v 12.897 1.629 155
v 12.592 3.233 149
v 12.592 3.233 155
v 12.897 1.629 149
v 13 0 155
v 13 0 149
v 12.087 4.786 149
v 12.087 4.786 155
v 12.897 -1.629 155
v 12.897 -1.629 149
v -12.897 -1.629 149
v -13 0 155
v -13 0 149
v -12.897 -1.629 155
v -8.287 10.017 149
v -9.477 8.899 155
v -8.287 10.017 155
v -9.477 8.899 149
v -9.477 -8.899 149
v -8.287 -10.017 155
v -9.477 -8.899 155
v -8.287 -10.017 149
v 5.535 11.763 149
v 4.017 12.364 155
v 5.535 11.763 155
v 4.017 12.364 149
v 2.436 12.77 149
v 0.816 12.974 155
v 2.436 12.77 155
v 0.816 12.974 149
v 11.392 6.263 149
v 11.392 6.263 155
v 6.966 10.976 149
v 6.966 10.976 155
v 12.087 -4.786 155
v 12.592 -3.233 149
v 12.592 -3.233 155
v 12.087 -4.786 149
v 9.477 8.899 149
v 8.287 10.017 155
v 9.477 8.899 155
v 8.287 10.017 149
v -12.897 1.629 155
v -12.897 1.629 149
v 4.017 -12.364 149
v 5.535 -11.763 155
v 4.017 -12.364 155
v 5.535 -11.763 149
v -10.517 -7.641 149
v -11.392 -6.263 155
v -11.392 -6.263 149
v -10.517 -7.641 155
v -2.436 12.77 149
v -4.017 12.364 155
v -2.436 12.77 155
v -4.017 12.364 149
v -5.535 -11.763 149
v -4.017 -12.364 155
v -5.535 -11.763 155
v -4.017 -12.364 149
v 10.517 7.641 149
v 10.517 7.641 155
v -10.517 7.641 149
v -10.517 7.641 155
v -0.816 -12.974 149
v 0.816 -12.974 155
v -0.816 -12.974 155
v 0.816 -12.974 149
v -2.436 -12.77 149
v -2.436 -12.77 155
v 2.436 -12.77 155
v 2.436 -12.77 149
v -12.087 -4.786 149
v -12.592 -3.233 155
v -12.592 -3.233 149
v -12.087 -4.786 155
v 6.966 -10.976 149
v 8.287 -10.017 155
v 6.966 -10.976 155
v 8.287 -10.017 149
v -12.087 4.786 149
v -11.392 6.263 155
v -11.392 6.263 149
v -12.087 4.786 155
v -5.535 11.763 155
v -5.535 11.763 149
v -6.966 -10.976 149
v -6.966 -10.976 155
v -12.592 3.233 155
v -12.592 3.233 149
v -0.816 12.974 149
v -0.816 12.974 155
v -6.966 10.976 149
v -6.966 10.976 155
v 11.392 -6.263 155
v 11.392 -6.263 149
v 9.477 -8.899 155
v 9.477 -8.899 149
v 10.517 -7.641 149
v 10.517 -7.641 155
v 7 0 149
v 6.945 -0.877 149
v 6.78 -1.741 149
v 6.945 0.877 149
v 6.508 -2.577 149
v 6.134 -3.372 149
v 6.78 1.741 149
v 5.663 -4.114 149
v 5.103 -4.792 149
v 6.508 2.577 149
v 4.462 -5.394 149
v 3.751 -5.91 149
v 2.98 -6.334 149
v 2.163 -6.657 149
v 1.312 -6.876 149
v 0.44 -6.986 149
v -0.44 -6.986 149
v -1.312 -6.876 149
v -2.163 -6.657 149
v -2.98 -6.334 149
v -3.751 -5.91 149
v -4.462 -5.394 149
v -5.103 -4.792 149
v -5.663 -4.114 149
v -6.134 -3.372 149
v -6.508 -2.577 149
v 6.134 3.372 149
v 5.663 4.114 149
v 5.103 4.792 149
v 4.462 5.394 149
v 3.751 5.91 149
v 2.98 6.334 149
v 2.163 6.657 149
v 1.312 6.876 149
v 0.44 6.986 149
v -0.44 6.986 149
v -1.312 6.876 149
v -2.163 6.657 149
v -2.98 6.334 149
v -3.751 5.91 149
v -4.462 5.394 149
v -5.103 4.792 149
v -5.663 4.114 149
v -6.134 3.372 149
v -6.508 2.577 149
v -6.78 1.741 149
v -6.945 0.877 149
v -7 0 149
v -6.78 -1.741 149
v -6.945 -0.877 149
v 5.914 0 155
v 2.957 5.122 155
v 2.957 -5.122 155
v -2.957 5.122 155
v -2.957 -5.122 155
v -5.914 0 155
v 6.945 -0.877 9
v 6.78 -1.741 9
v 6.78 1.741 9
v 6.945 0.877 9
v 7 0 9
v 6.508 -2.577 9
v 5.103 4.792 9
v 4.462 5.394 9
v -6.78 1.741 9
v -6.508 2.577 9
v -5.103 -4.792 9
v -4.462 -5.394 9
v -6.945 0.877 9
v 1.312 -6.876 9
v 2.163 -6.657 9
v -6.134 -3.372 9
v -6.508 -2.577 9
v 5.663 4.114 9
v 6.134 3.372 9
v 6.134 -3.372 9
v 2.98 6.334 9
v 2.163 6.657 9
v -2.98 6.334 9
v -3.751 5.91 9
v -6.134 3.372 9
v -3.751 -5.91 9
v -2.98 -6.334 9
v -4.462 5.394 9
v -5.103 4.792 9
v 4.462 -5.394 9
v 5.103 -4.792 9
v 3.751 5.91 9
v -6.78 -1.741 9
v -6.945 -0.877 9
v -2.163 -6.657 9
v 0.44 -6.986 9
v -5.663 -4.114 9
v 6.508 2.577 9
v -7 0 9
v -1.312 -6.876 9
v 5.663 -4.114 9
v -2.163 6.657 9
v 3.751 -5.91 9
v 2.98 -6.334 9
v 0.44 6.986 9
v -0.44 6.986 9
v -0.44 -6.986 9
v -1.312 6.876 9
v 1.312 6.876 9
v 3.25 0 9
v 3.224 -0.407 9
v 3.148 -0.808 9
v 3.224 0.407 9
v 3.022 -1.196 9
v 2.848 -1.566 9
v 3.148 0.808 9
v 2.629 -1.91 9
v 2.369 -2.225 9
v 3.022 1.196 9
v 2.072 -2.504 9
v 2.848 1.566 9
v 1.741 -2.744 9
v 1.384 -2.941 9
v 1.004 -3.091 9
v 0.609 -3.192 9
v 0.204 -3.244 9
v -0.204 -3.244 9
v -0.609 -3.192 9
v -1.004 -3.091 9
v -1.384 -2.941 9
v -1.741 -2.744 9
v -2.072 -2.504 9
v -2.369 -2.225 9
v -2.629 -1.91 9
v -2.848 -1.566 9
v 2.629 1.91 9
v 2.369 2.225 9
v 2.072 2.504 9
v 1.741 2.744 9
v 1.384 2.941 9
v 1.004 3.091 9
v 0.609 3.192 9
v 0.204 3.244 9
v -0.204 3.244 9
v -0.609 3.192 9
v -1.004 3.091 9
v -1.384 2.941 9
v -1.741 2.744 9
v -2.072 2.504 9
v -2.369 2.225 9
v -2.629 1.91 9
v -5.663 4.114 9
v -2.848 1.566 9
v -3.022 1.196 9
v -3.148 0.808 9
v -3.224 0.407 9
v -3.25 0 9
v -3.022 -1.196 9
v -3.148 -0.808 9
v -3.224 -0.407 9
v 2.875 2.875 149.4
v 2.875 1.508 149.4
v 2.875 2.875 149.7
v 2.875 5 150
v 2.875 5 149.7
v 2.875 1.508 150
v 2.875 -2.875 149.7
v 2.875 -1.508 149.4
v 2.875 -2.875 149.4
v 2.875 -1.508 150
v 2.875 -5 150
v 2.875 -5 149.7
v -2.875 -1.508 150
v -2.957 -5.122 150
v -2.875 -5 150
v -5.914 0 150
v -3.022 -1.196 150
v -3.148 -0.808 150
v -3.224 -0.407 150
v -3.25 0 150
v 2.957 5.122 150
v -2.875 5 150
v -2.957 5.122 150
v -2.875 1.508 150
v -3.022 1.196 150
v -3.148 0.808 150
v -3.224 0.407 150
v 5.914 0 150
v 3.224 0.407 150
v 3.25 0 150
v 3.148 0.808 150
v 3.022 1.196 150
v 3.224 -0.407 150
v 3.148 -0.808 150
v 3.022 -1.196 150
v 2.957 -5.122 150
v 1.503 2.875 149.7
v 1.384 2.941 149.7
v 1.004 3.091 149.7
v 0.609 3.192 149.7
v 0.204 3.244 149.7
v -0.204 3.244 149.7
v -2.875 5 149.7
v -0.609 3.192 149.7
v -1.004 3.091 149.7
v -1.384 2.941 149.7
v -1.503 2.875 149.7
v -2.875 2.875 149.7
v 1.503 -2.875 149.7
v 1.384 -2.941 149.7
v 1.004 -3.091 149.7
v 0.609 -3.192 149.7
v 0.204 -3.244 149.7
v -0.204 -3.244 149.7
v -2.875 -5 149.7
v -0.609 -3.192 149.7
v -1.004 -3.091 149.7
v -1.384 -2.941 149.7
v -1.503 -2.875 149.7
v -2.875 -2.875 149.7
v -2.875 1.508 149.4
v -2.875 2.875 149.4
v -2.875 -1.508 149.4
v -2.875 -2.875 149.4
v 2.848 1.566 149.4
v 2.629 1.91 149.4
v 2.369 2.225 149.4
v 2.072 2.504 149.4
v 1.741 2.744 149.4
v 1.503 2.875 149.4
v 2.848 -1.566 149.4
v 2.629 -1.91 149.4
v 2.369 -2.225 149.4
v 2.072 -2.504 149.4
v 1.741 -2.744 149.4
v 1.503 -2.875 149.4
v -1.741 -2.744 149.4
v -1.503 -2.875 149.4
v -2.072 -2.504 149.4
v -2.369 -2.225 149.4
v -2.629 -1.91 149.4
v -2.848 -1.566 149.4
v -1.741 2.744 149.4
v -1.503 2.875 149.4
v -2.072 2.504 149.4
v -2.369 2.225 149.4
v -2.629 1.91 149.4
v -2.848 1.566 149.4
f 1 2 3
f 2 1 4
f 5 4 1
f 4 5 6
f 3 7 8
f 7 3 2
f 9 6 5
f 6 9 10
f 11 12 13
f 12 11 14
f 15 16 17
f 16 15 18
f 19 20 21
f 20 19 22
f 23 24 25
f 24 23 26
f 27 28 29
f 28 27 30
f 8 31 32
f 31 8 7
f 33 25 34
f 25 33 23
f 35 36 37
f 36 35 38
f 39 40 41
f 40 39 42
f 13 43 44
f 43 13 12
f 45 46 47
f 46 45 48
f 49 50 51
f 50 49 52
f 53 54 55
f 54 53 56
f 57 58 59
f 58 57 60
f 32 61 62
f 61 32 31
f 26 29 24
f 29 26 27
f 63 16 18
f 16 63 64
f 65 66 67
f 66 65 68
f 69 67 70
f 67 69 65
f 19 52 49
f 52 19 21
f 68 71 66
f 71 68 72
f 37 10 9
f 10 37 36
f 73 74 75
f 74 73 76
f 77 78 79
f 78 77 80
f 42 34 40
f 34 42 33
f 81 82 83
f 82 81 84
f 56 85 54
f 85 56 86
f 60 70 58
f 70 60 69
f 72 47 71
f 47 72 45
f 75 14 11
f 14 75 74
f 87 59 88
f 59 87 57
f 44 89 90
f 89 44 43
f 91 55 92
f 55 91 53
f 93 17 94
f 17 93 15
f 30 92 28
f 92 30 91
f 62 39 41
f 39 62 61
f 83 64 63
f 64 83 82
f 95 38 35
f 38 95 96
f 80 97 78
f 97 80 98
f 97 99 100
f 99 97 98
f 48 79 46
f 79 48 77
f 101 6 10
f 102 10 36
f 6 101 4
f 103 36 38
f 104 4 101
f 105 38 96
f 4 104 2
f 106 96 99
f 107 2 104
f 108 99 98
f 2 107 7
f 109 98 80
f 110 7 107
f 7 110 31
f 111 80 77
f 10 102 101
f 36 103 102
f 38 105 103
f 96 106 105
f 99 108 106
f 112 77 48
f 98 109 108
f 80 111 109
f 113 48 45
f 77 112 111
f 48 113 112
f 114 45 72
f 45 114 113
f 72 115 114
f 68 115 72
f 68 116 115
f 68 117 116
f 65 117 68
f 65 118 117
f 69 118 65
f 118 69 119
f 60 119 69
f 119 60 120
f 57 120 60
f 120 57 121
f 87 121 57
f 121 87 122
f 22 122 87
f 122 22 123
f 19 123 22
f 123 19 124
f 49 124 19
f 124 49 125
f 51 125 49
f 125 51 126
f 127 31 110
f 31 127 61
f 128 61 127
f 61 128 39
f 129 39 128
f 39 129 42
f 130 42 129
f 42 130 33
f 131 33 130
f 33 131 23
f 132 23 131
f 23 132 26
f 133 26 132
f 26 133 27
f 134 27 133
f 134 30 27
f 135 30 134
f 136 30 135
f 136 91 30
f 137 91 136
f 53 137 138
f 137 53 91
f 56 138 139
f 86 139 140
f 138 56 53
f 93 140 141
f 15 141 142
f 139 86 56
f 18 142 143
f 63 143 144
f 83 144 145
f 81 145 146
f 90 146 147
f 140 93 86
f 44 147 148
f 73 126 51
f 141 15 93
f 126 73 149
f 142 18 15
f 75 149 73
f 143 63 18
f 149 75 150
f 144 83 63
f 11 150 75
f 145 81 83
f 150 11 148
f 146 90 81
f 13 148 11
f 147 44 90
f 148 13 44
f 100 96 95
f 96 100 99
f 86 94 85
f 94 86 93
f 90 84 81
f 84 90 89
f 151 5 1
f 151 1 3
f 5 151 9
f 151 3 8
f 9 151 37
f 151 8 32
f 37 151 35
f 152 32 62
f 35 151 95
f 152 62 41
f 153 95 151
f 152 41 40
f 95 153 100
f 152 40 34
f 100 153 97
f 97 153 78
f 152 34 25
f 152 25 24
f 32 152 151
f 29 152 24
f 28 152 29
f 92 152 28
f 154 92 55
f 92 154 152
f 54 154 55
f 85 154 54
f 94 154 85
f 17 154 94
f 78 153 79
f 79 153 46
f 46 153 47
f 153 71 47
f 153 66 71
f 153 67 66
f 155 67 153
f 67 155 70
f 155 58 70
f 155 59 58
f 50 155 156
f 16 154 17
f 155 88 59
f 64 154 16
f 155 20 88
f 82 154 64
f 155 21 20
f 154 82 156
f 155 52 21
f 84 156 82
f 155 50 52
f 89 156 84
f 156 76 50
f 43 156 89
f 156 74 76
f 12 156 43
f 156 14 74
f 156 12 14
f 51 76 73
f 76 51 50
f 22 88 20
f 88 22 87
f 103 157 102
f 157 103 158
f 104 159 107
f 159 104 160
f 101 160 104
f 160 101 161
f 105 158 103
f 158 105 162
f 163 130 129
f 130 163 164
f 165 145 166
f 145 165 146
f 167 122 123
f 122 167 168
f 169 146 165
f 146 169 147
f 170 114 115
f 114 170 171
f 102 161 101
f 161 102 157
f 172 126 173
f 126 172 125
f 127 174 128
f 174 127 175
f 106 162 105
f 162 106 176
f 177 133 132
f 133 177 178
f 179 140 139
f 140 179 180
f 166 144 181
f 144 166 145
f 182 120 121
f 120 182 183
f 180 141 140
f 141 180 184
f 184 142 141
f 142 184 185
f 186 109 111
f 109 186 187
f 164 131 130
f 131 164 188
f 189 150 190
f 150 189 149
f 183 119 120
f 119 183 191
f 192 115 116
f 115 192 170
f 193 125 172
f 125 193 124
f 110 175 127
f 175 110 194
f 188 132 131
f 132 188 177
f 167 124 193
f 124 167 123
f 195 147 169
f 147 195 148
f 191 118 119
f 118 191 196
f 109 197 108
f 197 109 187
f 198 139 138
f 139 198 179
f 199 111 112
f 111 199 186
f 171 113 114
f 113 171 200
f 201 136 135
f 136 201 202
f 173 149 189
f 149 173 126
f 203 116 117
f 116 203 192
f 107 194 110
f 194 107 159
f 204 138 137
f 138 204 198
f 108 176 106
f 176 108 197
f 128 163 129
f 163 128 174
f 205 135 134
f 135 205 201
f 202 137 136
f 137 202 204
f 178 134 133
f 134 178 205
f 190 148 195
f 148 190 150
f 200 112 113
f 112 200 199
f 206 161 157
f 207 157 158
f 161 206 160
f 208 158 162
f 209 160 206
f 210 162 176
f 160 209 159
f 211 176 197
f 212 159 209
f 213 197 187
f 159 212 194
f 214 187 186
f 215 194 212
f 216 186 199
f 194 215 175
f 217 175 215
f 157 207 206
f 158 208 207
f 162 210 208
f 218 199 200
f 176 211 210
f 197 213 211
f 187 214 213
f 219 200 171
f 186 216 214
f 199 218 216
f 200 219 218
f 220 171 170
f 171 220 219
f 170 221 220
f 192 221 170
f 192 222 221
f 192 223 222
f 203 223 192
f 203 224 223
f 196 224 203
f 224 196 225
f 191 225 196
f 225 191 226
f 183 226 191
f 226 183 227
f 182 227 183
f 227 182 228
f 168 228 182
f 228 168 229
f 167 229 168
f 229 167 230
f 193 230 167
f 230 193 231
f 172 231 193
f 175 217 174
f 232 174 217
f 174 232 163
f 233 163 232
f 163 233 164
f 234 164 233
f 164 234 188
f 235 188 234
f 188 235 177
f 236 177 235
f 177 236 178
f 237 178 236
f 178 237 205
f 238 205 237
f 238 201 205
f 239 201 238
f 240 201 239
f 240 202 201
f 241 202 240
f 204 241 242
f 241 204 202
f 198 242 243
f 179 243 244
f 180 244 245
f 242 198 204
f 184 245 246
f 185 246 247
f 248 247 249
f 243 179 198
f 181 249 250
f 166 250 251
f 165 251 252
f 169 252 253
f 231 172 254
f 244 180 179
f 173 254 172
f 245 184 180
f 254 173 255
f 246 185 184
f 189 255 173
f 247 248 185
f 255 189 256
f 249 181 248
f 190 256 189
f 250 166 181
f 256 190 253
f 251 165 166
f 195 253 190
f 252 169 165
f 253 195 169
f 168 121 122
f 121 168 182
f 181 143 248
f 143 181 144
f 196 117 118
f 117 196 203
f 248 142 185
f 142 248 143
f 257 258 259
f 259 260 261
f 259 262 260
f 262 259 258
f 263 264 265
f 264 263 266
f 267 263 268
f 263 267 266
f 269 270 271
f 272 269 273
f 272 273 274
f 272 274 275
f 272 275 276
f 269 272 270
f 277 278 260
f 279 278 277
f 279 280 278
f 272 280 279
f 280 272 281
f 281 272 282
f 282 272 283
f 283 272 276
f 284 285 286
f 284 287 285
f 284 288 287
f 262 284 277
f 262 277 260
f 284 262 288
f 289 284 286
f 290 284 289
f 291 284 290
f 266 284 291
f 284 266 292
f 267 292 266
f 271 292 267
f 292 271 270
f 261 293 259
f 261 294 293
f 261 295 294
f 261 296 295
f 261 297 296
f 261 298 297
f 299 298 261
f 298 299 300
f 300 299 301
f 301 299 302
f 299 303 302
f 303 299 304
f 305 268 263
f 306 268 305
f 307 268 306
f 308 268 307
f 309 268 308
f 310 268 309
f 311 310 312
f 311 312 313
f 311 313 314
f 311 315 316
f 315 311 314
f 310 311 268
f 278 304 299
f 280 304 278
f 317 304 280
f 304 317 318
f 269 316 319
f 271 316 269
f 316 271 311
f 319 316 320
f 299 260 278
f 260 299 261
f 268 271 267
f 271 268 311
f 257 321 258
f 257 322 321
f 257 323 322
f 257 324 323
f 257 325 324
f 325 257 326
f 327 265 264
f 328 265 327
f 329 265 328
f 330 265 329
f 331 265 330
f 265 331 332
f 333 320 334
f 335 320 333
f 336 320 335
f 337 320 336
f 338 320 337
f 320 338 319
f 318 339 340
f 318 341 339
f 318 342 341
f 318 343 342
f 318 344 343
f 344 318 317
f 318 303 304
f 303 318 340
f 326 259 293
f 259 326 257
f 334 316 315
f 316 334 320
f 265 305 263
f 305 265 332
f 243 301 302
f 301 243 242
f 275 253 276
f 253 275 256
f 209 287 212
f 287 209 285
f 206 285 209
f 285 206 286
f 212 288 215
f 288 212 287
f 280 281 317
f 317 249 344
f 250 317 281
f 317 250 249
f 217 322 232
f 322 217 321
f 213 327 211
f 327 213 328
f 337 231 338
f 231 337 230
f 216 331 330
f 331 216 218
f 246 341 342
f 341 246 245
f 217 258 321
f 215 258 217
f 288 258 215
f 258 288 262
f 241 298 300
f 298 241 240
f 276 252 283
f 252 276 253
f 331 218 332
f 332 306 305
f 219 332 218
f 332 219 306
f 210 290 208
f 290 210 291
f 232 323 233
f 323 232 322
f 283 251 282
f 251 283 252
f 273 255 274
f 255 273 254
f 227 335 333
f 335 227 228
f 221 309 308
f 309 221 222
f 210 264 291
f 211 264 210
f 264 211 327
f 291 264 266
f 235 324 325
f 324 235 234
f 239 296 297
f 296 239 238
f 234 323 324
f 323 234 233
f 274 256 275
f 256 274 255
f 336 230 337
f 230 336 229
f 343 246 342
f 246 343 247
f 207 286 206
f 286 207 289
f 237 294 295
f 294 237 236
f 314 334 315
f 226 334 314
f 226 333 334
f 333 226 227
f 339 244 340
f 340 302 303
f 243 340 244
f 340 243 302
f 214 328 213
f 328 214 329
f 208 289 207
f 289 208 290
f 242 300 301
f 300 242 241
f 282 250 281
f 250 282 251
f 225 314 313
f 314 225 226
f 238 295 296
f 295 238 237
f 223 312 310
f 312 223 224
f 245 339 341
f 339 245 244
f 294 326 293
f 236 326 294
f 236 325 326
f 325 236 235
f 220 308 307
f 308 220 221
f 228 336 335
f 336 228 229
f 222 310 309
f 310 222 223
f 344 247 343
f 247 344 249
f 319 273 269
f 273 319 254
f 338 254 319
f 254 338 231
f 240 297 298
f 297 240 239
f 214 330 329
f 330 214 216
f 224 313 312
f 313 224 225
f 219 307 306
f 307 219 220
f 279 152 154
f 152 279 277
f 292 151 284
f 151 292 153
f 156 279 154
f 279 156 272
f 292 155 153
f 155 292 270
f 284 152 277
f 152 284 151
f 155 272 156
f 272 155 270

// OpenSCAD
$fn = 50;


difference() {
	union() {
		translate(v = [0, 0, 149.0000000000]) {
			cylinder(h = 6, r = 13.0000000000);
		}
		translate(v = [0, 0, 9.0000000000]) {
			cylinder(h = 146, r = 7.0000000000);
		}
	}
	union() {
		translate(v = [0, 0, 155]) {
			rotate(a = [0, 0, 0]) {
				difference() {
					union() {
						#translate(v = [-2.8750000000, -5.0000000000, -5.3000000000]) {
							cube(size = [5.7500000000, 10, 0.3000000000]);
						}
						#translate(v = [-2.8750000000, -2.8750000000, -5.6000000000]) {
							cube(size = [5.7500000000, 5.7500000000, 0.3000000000]);
						}
						#translate(v = [-2.8750000000, -5.0000000000, 0]) {
							cube(size = [5.7500000000, 10, 0.3000000000]);
						}
						#translate(v = [-2.8750000000, -2.8750000000, 0.3000000000]) {
							cube(size = [5.7500000000, 5.7500000000, 0.3000000000]);
						}
						#translate(v = [0, 0, -100.0000000000]) {
							cylinder(h = 200, r = 3.2500000000);
						}
						translate(v = [0, 0, -5]) {
							#linear_extrude(height = 5) {
								polygon(points = [[5.9142500000, 0.0000000000], [2.9571250000, 5.1218907443], [-2.9571250000, 5.1218907443], [-5.9142500000, 0.0000000000], [-2.9571250000, -5.1218907443], [2.9571250000, -5.1218907443]]);
							}
						}
						#translate(v = [-2.8750000000, -5.0000000000, -5.3000000000]) {
							cube(size = [5.7500000000, 10, 0.3000000000]);
						}
						#translate(v = [-2.8750000000, -2.8750000000, -5.6000000000]) {
							cube(size = [5.7500000000, 5.7500000000, 0.3000000000]);
						}
						#translate(v = [-2.8750000000, -5.0000000000, 0]) {
							cube(size = [5.7500000000, 10, 0.3000000000]);
						}
						#translate(v = [-2.8750000000, -2.8750000000, 0.3000000000]) {
							cube(size = [5.7500000000, 5.7500000000, 0.3000000000]);
						}
						#translate(v = [0, 0, -100.0000000000]) {
							cylinder(h = 200, r = 3.2500000000);
						}
						#translate(v = [-2.8750000000, -5.0000000000, -5.3000000000]) {
							cube(size = [5.7500000000, 10, 0.3000000000]);
						}
						#translate(v = [-2.8750000000, -2.8750000000, -5.6000000000]) {
							cube(size = [5.7500000000, 5.7500000000, 0.3000000000]);
						}
						#translate(v = [-2.8750000000, -5.0000000000, 0]) {
							cube(size = [5.7500000000, 10, 0.3000000000]);
						}
						#translate(v = [-2.8750000000, -2.8750000000, 0.3000000000]) {
							cube(size = [5.7500000000, 5.7500000000, 0.3000000000]);
						}
						#translate(v = [0, 0, -100.0000000000]) {
							cylinder(h = 200, r = 3.2500000000);
						}
					}
					union();
				}
			}
		}
		#translate(v = [0, 0, -100.0000000000]) {
			cylinder(h = 200, r = 3.2500000000);
		}
	}
}
